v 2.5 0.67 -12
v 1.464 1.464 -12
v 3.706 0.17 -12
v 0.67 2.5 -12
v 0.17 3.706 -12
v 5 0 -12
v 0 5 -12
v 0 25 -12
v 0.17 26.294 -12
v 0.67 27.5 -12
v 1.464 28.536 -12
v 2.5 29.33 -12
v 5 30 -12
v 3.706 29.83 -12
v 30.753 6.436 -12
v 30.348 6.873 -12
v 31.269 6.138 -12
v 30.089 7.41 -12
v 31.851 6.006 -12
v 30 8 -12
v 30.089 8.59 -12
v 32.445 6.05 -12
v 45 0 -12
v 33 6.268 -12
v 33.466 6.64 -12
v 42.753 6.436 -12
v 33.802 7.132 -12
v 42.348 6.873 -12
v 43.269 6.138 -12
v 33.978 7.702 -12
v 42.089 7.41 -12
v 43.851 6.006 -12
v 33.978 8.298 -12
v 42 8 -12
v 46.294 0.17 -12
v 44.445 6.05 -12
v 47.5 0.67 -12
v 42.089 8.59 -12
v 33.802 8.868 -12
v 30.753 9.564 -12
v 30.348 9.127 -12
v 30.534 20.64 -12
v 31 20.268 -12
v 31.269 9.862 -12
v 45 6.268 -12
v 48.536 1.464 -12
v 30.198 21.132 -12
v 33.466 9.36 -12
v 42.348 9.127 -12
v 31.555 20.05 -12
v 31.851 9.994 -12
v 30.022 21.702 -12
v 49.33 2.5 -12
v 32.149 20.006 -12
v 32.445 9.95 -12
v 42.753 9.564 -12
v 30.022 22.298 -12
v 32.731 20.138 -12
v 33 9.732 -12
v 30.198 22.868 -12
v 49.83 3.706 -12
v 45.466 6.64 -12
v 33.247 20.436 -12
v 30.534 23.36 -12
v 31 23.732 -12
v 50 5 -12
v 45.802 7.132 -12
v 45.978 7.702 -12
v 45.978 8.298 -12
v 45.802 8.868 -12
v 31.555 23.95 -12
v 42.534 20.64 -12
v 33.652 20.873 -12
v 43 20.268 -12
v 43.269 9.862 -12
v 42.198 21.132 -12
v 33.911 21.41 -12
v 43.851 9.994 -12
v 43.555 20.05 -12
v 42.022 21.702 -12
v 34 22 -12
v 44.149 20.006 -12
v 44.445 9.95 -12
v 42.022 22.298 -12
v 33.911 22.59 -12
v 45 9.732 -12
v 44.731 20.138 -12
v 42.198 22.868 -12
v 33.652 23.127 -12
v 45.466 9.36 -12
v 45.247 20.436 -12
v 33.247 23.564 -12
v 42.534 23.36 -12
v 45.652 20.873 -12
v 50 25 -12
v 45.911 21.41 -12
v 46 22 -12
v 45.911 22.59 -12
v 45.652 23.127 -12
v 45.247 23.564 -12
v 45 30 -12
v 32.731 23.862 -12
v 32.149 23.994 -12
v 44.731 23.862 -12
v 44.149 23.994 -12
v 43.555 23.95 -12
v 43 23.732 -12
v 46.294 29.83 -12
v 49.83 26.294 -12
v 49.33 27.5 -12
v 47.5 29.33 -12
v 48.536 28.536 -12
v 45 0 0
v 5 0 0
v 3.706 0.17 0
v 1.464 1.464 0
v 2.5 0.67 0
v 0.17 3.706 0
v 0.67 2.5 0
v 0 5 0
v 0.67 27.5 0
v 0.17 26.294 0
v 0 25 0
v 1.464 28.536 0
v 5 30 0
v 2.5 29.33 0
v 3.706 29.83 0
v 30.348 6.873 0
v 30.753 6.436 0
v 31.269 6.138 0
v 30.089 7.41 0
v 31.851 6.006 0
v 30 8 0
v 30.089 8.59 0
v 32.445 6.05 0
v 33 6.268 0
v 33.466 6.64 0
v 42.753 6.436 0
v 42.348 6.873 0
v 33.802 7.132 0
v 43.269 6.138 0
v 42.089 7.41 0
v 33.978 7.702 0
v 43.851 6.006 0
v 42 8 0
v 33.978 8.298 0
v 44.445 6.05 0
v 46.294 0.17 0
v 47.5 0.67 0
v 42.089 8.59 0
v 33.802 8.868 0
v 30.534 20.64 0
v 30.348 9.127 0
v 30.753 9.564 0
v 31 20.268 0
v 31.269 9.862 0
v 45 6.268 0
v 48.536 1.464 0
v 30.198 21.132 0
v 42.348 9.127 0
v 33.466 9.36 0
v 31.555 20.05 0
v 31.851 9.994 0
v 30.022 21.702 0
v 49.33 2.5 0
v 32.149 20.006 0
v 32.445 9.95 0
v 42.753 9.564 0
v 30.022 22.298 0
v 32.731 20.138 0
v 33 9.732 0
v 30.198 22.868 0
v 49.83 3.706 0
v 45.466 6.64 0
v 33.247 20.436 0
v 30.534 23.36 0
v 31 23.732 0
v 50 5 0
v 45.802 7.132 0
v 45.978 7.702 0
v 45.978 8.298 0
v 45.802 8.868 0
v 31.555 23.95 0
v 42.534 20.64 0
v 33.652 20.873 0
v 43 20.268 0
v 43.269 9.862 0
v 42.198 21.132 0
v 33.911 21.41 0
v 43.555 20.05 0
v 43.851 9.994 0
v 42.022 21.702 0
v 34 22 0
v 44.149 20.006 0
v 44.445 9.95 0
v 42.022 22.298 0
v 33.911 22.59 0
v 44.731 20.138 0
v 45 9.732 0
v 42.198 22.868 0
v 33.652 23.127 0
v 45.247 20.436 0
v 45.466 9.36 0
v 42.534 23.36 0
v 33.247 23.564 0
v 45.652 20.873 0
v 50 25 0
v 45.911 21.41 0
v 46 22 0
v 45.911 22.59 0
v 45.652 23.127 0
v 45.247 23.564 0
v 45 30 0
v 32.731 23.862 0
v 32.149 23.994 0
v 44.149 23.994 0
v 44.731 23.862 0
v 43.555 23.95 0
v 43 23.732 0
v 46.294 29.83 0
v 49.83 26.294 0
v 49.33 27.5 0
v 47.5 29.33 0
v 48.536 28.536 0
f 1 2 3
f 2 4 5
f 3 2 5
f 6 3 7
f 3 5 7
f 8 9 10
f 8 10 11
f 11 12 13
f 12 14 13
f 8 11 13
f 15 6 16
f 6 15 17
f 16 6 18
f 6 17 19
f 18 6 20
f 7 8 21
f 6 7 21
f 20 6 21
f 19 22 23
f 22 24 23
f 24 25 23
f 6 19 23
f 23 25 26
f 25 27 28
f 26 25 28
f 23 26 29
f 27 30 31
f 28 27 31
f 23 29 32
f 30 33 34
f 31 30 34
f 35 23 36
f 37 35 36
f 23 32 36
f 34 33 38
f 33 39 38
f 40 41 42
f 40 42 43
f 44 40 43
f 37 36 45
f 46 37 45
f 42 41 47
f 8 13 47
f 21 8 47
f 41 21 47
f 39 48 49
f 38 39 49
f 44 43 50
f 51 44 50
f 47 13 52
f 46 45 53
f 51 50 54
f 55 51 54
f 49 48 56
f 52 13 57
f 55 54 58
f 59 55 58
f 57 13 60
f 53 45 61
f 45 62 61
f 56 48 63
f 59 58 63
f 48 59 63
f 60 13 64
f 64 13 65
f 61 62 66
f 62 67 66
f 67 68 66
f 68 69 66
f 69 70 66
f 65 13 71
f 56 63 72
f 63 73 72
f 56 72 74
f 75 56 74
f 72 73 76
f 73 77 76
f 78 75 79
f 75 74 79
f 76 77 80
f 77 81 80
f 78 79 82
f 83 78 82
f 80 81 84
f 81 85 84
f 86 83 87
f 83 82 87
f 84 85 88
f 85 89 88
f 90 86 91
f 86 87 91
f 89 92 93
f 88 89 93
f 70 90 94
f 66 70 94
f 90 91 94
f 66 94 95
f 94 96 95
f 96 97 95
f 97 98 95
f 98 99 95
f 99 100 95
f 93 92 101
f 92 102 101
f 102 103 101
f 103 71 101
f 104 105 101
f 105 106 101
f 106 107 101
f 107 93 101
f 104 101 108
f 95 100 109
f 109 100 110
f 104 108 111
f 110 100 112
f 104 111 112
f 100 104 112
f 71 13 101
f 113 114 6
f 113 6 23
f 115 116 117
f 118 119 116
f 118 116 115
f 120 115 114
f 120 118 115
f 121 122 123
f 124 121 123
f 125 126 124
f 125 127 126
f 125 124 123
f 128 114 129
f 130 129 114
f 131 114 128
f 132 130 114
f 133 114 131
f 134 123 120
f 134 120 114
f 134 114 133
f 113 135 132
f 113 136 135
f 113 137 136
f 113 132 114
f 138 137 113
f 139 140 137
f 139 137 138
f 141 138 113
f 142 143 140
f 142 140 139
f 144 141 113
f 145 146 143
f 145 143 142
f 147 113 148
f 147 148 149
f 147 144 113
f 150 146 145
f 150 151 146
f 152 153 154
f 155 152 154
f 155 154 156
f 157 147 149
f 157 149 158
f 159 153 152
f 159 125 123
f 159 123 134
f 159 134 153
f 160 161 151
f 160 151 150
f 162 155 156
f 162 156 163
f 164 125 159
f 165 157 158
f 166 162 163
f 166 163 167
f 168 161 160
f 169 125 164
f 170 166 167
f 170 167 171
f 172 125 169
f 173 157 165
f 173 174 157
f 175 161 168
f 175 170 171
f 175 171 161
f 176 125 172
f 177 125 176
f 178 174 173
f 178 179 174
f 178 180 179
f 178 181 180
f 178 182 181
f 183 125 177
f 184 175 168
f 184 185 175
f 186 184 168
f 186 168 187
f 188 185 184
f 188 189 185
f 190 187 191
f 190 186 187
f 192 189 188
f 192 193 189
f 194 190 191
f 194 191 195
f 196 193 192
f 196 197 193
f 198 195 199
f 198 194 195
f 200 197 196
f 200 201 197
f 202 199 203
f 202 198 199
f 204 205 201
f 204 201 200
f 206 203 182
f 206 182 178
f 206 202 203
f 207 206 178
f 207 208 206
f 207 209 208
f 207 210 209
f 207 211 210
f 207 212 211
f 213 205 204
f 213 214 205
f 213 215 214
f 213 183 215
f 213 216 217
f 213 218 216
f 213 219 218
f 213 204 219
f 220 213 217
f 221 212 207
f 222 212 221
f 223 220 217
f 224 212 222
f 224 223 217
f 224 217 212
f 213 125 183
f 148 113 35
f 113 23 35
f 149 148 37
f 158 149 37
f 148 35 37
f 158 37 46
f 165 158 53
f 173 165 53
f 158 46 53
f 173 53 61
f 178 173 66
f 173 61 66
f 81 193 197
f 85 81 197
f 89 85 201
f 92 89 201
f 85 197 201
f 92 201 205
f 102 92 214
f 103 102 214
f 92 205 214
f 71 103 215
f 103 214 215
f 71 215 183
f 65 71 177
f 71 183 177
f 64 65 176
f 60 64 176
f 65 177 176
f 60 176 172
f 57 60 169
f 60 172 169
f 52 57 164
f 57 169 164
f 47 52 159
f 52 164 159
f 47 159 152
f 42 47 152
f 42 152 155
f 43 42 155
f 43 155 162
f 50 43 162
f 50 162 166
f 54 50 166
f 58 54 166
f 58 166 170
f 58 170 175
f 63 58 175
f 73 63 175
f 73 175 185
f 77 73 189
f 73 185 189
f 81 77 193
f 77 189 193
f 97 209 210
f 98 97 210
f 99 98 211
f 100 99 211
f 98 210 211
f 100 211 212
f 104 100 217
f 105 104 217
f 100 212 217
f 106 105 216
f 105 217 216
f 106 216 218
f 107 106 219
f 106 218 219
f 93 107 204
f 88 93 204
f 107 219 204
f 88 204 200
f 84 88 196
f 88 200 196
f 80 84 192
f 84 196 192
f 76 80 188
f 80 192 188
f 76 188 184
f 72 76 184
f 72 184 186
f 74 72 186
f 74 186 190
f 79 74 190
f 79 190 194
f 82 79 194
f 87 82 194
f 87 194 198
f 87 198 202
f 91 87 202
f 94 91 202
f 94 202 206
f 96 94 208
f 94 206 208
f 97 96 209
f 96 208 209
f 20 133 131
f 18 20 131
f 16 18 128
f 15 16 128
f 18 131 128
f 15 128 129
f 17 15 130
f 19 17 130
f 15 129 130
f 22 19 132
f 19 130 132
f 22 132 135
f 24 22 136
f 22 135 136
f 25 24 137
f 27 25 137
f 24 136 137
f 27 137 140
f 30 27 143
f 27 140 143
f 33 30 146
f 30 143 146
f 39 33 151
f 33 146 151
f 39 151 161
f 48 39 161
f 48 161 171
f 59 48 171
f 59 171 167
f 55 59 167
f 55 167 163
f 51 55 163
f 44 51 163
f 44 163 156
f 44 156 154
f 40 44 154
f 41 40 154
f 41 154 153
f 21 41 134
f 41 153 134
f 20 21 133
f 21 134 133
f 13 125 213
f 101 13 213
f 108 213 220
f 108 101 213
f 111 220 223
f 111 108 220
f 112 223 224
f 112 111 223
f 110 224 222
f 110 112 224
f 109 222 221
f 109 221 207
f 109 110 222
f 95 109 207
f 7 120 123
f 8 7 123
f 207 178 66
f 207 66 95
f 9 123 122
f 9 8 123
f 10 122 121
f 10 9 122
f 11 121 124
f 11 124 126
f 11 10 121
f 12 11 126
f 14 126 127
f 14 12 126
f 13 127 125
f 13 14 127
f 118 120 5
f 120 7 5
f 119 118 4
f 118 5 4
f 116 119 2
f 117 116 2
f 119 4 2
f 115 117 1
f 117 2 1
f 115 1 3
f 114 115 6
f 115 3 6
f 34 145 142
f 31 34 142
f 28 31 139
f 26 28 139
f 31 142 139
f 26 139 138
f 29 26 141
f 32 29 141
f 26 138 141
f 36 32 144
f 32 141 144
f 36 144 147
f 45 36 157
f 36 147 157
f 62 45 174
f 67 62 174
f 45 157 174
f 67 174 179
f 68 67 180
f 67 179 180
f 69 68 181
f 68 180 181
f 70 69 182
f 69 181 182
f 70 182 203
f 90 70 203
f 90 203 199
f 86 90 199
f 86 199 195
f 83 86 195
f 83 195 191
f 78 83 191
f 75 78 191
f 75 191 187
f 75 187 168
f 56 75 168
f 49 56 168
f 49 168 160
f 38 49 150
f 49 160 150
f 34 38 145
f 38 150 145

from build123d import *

# Parameters (mm, degrees)
SKETCH_1_W          = 50
SKETCH_1_H          = 30
EXTRUDE_1_DEPTH     = 12
SKETCH_2_R          = 2
CUT_EXTRUDE_1_DEPTH = 12
FILLET_1_R          = 5


with BuildPart() as part:
    # 草图1 → 凸台-拉伸1 (new body)
    with BuildSketch(Plane.XY):
        with Locations((25, 15)):
            Rectangle(SKETCH_1_W, SKETCH_1_H)
    extrude(amount=-EXTRUDE_1_DEPTH)

    # 草图2 → 切除-拉伸1 (cut)
    with BuildSketch(Plane.XY):
        with Locations((44, 22)):
            Circle(SKETCH_2_R)
        with Locations(Location((44, 8, 0), (0, 0, 180))):
            Circle(SKETCH_2_R)
        with Locations((32, 22)):
            Circle(SKETCH_2_R)
        with Locations(Location((32, 8, 0), (0, 0, 180))):
            Circle(SKETCH_2_R)
    extrude(amount=-CUT_EXTRUDE_1_DEPTH, mode=Mode.SUBTRACT)

    # 圆角1
    fillet_1_edges = [part.edges().sort_by_distance(p)[0] for p in [
        (0, 30, -6),
        (50, 30, -6),
        (50, 0, -6),
        (0, 0, -6),
    ]]
    fillet(fillet_1_edges, radius=FILLET_1_R)


solid = part.part
